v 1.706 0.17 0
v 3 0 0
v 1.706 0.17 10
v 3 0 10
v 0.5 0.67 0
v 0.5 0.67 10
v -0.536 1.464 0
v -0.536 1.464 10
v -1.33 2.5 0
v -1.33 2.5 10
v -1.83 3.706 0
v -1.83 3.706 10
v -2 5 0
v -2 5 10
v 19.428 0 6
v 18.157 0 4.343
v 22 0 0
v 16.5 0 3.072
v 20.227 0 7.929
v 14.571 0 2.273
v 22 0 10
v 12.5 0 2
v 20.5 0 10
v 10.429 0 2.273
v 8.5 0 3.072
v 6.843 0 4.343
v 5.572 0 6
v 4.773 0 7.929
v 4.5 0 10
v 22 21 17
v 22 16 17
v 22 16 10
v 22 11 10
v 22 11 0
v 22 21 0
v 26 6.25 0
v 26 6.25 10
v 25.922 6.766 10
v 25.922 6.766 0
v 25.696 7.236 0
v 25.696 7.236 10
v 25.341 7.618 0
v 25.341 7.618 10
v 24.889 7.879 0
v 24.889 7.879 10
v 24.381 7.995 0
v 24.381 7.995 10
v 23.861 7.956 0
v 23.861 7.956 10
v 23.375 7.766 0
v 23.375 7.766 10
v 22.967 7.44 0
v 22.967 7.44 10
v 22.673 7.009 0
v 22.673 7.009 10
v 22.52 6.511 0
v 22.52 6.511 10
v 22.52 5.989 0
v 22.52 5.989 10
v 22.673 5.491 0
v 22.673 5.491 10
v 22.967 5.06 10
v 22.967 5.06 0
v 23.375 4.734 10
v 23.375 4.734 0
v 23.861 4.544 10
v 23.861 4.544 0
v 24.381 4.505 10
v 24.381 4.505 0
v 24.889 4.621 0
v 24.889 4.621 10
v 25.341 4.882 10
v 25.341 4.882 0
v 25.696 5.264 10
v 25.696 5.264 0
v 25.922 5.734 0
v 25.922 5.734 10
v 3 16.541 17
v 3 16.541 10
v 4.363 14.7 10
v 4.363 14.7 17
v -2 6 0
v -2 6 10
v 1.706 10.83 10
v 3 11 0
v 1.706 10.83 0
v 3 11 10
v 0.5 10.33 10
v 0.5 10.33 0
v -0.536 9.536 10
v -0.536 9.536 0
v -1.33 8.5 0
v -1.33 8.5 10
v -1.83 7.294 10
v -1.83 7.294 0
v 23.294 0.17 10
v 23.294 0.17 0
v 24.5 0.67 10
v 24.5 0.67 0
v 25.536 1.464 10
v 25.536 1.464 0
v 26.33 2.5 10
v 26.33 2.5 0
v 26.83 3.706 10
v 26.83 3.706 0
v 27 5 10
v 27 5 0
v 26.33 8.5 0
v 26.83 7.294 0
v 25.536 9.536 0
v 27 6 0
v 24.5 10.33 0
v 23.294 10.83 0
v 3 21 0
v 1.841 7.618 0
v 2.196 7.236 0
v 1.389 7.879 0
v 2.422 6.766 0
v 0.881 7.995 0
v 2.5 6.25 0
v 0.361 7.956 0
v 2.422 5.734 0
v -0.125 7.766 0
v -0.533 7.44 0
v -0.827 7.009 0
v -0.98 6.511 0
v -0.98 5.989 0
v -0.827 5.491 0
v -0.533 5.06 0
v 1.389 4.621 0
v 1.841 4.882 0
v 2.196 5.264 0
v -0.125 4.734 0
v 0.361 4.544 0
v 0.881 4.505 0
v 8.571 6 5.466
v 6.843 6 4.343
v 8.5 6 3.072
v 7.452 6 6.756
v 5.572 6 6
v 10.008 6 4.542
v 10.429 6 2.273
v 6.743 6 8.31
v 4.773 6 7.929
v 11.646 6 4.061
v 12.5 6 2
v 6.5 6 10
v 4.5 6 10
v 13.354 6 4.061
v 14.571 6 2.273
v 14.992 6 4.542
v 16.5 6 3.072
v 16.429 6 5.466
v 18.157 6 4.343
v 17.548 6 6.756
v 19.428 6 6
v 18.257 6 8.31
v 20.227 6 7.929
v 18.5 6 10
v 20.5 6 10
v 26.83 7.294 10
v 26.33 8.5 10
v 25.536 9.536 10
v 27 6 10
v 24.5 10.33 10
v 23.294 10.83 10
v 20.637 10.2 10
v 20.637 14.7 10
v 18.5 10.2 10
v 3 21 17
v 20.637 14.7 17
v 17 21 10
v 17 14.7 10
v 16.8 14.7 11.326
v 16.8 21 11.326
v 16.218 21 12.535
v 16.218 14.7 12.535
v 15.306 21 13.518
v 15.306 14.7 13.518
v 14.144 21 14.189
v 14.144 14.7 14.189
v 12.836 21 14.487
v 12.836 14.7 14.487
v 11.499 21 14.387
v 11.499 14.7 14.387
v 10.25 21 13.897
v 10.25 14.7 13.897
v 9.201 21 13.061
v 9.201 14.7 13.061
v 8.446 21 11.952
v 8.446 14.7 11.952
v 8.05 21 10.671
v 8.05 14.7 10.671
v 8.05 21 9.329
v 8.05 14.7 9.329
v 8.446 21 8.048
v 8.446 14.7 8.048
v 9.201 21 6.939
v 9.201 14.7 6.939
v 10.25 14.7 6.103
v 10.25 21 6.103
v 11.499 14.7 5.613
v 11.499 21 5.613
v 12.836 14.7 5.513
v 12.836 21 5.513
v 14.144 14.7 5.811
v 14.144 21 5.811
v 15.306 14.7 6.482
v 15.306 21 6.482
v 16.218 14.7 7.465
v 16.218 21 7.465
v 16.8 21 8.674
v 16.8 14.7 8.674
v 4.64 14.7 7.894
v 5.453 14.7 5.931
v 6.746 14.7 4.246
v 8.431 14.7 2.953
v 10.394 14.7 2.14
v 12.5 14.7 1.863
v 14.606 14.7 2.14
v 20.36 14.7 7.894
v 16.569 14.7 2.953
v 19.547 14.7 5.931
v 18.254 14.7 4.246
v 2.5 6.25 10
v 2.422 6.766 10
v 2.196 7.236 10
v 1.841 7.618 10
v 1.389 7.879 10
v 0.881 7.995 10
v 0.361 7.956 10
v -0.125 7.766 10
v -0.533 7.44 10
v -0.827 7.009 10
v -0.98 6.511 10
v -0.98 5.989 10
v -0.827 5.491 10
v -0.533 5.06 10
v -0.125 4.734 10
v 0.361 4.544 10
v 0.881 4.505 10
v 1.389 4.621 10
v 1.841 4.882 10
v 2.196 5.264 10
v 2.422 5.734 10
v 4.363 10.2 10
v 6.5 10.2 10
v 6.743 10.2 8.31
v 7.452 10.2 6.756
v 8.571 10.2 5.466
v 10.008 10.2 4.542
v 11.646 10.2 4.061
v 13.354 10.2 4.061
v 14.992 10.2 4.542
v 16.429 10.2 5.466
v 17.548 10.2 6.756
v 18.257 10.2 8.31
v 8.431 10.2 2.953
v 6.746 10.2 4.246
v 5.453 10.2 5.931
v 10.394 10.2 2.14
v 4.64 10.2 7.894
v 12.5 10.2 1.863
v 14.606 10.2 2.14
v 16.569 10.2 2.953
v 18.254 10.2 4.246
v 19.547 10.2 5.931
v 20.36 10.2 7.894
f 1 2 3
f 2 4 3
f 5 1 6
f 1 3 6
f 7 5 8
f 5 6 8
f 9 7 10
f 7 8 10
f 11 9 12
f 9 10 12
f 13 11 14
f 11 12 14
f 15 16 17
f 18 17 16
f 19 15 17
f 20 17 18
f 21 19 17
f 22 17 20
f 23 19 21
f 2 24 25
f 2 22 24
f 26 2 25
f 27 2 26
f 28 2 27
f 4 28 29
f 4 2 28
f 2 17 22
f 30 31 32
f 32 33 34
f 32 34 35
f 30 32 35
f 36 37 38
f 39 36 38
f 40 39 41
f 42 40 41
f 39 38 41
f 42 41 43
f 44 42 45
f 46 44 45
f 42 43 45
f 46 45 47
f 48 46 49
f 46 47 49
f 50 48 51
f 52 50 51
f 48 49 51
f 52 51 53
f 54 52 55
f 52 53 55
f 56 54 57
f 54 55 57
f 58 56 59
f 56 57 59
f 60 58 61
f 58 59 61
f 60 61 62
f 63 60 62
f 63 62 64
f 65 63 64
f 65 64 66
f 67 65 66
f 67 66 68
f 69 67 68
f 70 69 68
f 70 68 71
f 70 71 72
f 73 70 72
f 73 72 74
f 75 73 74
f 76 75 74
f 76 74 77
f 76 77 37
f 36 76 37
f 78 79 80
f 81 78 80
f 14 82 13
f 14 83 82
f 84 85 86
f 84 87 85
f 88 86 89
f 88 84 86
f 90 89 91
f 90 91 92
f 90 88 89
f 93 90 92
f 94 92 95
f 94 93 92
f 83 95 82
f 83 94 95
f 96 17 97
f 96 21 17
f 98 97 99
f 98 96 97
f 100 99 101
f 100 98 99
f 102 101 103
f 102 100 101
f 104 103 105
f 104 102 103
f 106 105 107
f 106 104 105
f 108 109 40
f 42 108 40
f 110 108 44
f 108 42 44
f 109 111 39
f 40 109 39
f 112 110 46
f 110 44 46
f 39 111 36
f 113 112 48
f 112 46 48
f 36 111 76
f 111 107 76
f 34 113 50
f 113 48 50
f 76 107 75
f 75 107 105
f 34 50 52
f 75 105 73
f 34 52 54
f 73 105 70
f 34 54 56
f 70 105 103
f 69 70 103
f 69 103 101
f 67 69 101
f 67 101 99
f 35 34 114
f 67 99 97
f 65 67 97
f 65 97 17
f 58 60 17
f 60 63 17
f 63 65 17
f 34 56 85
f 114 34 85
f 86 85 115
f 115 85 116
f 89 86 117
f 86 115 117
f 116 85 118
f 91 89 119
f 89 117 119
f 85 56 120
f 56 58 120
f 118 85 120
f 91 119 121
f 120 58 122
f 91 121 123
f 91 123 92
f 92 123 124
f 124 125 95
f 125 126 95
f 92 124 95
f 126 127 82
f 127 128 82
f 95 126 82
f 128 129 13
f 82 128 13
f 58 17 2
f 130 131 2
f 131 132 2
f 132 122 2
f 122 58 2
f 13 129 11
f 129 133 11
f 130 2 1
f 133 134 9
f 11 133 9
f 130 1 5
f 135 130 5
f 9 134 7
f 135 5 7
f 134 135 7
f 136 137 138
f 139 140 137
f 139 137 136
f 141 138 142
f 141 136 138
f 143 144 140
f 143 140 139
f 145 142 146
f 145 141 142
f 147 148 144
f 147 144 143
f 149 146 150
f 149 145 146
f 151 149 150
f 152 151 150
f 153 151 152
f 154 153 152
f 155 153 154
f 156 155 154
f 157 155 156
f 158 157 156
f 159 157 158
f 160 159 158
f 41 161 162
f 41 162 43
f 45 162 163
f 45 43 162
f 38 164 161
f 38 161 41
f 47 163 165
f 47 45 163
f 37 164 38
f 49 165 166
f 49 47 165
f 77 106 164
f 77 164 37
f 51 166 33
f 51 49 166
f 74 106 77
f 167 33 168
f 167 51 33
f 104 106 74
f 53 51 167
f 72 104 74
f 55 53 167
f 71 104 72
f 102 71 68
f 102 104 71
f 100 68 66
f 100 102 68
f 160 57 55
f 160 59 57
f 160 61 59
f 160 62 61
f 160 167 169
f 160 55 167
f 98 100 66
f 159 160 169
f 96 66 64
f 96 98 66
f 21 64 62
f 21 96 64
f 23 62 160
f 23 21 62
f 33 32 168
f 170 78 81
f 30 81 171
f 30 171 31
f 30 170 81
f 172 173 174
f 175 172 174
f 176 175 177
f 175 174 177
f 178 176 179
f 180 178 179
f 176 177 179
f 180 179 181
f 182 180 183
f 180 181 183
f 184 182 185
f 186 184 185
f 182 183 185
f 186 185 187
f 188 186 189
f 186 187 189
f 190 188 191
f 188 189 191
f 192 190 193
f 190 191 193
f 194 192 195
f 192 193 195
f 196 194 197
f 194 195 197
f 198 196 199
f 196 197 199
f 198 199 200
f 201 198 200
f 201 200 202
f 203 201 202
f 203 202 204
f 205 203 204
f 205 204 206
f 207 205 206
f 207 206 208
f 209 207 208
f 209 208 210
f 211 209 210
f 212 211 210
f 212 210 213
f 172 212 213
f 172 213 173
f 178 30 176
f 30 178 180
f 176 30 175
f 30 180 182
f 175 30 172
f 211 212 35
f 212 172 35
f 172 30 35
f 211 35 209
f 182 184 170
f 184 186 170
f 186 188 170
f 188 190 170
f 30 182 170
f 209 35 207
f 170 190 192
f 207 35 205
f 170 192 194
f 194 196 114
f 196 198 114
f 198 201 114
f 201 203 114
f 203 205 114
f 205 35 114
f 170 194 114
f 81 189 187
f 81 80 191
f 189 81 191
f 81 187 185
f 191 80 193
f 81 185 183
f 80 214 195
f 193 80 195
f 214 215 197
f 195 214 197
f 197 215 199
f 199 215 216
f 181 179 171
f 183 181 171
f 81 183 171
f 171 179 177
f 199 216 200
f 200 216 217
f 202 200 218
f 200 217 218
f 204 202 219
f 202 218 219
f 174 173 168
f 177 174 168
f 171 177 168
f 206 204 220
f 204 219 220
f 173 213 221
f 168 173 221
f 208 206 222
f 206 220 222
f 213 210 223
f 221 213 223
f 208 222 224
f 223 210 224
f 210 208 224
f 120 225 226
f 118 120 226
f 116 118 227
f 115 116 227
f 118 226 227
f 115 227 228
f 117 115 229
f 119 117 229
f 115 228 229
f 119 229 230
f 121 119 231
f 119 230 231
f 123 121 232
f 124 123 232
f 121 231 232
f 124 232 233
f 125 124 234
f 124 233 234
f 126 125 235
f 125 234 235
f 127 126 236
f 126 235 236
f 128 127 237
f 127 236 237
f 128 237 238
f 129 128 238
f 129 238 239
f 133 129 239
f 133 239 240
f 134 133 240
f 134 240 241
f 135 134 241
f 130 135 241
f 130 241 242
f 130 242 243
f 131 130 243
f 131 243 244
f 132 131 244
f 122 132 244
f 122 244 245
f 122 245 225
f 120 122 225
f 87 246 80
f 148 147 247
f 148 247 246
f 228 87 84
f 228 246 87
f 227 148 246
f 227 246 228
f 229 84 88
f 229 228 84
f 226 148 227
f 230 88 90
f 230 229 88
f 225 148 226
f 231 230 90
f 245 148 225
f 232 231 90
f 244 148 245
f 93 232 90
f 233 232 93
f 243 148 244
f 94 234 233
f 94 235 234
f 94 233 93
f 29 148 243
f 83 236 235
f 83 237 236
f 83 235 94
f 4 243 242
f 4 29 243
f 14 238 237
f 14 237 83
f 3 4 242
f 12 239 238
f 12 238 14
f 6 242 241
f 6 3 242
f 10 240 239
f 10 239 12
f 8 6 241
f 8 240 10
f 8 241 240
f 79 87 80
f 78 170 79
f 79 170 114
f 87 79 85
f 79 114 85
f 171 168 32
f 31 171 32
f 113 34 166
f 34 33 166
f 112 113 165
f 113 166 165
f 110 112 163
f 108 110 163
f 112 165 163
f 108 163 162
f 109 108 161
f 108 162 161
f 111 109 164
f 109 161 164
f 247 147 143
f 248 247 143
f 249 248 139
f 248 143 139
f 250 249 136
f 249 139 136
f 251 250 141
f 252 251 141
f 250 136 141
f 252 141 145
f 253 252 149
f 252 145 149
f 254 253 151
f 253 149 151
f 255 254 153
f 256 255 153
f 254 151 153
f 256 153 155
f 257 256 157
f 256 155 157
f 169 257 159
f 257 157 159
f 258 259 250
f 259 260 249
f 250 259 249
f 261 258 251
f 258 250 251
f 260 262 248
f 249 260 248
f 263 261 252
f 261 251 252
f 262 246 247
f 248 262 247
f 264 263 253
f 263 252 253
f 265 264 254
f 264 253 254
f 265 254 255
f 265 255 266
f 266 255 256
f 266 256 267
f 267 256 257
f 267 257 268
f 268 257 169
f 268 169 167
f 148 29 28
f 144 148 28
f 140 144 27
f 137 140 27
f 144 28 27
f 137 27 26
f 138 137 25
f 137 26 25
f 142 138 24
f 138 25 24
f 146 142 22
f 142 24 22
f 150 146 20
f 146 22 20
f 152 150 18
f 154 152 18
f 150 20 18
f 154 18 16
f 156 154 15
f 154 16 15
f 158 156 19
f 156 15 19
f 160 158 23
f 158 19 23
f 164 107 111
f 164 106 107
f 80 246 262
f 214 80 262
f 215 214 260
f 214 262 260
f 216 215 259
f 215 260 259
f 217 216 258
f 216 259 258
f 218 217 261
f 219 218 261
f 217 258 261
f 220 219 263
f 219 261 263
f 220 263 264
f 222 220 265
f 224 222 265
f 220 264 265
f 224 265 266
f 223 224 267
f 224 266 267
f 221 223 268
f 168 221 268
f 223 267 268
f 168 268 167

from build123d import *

# Parameters (mm, degrees)
F0_W      = 25
F0_H      = 11
F1_DEPTH  = 10
F2_R      = 8
F3_DEPTH  = 6
F4_R      = 6
F5_DEPTH  = 4.2
F6_W      = 11
F6_H      = 10
F7_DEPTH  = 2
F8_W      = 11
F8_H      = 10
F9_DEPTH  = 2
F10_R     = 5
F11_R     = 1.75
F12_DEPTH = 25
F9_FACE_W = 19
F9_FACE_H = 10
F13_DEPTH = 10
F14_R     = 8.137493
F15_DEPTH = 4.5
F17_DEPTH = 7
F18_R     = 4.5
F19_DEPTH = 25


with BuildPart() as f1:
    # F0 (on Top) → F1 (new body)
    with BuildSketch(Plane.XY):
        with Locations((12.5, 5.5)):
            Rectangle(F0_W, F0_H)
    extrude(amount=F1_DEPTH)

    # F2 (on face) → F3 (cut)
    with BuildSketch(Plane.XZ):
        with Locations((12.5, 10)):
            Circle(F2_R)
    extrude(amount=-F3_DEPTH, mode=Mode.SUBTRACT)

    # F4 (on face) → F5 (cut)
    with BuildSketch(Plane.XZ.offset(-6)):
        with Locations((12.5, 10)):
            Circle(F4_R)
    extrude(amount=-F5_DEPTH, mode=Mode.SUBTRACT)

    # F6 (on face) → F7 (join)
    with BuildSketch(Plane(origin=(0, 0, 0), x_dir=(0, -1, 0), z_dir=(-1, 0, 0))):
        with Locations((-5.5, 5)):
            Rectangle(F6_W, F6_H)
    extrude(amount=F7_DEPTH)

    # F8 (on face) → F9 (join)
    with BuildSketch(Plane.YZ.offset(25)):
        with Locations((5.5, 5)):
            Rectangle(F8_W, F8_H)
    extrude(amount=F9_DEPTH)

    # F10
    f10_edges = [f1.edges().sort_by_distance(p)[0] for p in [
        (27, 11, 5),
        (27, 0, 5),
        (-2, 11, 5),
        (-2, 0, 5),
    ]]
    fillet(f10_edges, radius=F10_R)

    # F11 (on face) → F12 (cut)
    with BuildSketch(Plane.XY.offset(10)):
        with Locations((0.75, 6.25)):
            Circle(F11_R)
        with Locations((24.25, 6.25)):
            Circle(F11_R)
    extrude(amount=-F12_DEPTH, mode=Mode.SUBTRACT)

    # F9_face (on face) → F13 (join)
    with BuildSketch(Plane(origin=(12.5, 11, 5), x_dir=(-1, 0, 0), z_dir=(0, 1, 0))):
        Rectangle(F9_FACE_W, F9_FACE_H)
    extrude(amount=F13_DEPTH)

    # F14 (on face) → F15 (cut)
    with BuildSketch(Plane.XZ.offset(-10.2)):
        with Locations((12.5, 10)):
            Circle(F14_R)
    extrude(amount=-F15_DEPTH, mode=Mode.SUBTRACT)

    # F16 (on face) → F17 (join)
    with BuildSketch(Plane.XY.offset(10)):
        Polygon((3, 16.541481), (4.362507, 14.7), (20.637493, 14.7), (22, 16), (22, 21), (3, 21), align=None)
    extrude(amount=F17_DEPTH)

    # F18 (on face) → F19 (cut)
    with BuildSketch(Plane.XZ.offset(-14.7)):
        with Locations((12.5, 10)):
            Circle(F18_R)
    extrude(amount=-F19_DEPTH, mode=Mode.SUBTRACT)


solid = f1.part
